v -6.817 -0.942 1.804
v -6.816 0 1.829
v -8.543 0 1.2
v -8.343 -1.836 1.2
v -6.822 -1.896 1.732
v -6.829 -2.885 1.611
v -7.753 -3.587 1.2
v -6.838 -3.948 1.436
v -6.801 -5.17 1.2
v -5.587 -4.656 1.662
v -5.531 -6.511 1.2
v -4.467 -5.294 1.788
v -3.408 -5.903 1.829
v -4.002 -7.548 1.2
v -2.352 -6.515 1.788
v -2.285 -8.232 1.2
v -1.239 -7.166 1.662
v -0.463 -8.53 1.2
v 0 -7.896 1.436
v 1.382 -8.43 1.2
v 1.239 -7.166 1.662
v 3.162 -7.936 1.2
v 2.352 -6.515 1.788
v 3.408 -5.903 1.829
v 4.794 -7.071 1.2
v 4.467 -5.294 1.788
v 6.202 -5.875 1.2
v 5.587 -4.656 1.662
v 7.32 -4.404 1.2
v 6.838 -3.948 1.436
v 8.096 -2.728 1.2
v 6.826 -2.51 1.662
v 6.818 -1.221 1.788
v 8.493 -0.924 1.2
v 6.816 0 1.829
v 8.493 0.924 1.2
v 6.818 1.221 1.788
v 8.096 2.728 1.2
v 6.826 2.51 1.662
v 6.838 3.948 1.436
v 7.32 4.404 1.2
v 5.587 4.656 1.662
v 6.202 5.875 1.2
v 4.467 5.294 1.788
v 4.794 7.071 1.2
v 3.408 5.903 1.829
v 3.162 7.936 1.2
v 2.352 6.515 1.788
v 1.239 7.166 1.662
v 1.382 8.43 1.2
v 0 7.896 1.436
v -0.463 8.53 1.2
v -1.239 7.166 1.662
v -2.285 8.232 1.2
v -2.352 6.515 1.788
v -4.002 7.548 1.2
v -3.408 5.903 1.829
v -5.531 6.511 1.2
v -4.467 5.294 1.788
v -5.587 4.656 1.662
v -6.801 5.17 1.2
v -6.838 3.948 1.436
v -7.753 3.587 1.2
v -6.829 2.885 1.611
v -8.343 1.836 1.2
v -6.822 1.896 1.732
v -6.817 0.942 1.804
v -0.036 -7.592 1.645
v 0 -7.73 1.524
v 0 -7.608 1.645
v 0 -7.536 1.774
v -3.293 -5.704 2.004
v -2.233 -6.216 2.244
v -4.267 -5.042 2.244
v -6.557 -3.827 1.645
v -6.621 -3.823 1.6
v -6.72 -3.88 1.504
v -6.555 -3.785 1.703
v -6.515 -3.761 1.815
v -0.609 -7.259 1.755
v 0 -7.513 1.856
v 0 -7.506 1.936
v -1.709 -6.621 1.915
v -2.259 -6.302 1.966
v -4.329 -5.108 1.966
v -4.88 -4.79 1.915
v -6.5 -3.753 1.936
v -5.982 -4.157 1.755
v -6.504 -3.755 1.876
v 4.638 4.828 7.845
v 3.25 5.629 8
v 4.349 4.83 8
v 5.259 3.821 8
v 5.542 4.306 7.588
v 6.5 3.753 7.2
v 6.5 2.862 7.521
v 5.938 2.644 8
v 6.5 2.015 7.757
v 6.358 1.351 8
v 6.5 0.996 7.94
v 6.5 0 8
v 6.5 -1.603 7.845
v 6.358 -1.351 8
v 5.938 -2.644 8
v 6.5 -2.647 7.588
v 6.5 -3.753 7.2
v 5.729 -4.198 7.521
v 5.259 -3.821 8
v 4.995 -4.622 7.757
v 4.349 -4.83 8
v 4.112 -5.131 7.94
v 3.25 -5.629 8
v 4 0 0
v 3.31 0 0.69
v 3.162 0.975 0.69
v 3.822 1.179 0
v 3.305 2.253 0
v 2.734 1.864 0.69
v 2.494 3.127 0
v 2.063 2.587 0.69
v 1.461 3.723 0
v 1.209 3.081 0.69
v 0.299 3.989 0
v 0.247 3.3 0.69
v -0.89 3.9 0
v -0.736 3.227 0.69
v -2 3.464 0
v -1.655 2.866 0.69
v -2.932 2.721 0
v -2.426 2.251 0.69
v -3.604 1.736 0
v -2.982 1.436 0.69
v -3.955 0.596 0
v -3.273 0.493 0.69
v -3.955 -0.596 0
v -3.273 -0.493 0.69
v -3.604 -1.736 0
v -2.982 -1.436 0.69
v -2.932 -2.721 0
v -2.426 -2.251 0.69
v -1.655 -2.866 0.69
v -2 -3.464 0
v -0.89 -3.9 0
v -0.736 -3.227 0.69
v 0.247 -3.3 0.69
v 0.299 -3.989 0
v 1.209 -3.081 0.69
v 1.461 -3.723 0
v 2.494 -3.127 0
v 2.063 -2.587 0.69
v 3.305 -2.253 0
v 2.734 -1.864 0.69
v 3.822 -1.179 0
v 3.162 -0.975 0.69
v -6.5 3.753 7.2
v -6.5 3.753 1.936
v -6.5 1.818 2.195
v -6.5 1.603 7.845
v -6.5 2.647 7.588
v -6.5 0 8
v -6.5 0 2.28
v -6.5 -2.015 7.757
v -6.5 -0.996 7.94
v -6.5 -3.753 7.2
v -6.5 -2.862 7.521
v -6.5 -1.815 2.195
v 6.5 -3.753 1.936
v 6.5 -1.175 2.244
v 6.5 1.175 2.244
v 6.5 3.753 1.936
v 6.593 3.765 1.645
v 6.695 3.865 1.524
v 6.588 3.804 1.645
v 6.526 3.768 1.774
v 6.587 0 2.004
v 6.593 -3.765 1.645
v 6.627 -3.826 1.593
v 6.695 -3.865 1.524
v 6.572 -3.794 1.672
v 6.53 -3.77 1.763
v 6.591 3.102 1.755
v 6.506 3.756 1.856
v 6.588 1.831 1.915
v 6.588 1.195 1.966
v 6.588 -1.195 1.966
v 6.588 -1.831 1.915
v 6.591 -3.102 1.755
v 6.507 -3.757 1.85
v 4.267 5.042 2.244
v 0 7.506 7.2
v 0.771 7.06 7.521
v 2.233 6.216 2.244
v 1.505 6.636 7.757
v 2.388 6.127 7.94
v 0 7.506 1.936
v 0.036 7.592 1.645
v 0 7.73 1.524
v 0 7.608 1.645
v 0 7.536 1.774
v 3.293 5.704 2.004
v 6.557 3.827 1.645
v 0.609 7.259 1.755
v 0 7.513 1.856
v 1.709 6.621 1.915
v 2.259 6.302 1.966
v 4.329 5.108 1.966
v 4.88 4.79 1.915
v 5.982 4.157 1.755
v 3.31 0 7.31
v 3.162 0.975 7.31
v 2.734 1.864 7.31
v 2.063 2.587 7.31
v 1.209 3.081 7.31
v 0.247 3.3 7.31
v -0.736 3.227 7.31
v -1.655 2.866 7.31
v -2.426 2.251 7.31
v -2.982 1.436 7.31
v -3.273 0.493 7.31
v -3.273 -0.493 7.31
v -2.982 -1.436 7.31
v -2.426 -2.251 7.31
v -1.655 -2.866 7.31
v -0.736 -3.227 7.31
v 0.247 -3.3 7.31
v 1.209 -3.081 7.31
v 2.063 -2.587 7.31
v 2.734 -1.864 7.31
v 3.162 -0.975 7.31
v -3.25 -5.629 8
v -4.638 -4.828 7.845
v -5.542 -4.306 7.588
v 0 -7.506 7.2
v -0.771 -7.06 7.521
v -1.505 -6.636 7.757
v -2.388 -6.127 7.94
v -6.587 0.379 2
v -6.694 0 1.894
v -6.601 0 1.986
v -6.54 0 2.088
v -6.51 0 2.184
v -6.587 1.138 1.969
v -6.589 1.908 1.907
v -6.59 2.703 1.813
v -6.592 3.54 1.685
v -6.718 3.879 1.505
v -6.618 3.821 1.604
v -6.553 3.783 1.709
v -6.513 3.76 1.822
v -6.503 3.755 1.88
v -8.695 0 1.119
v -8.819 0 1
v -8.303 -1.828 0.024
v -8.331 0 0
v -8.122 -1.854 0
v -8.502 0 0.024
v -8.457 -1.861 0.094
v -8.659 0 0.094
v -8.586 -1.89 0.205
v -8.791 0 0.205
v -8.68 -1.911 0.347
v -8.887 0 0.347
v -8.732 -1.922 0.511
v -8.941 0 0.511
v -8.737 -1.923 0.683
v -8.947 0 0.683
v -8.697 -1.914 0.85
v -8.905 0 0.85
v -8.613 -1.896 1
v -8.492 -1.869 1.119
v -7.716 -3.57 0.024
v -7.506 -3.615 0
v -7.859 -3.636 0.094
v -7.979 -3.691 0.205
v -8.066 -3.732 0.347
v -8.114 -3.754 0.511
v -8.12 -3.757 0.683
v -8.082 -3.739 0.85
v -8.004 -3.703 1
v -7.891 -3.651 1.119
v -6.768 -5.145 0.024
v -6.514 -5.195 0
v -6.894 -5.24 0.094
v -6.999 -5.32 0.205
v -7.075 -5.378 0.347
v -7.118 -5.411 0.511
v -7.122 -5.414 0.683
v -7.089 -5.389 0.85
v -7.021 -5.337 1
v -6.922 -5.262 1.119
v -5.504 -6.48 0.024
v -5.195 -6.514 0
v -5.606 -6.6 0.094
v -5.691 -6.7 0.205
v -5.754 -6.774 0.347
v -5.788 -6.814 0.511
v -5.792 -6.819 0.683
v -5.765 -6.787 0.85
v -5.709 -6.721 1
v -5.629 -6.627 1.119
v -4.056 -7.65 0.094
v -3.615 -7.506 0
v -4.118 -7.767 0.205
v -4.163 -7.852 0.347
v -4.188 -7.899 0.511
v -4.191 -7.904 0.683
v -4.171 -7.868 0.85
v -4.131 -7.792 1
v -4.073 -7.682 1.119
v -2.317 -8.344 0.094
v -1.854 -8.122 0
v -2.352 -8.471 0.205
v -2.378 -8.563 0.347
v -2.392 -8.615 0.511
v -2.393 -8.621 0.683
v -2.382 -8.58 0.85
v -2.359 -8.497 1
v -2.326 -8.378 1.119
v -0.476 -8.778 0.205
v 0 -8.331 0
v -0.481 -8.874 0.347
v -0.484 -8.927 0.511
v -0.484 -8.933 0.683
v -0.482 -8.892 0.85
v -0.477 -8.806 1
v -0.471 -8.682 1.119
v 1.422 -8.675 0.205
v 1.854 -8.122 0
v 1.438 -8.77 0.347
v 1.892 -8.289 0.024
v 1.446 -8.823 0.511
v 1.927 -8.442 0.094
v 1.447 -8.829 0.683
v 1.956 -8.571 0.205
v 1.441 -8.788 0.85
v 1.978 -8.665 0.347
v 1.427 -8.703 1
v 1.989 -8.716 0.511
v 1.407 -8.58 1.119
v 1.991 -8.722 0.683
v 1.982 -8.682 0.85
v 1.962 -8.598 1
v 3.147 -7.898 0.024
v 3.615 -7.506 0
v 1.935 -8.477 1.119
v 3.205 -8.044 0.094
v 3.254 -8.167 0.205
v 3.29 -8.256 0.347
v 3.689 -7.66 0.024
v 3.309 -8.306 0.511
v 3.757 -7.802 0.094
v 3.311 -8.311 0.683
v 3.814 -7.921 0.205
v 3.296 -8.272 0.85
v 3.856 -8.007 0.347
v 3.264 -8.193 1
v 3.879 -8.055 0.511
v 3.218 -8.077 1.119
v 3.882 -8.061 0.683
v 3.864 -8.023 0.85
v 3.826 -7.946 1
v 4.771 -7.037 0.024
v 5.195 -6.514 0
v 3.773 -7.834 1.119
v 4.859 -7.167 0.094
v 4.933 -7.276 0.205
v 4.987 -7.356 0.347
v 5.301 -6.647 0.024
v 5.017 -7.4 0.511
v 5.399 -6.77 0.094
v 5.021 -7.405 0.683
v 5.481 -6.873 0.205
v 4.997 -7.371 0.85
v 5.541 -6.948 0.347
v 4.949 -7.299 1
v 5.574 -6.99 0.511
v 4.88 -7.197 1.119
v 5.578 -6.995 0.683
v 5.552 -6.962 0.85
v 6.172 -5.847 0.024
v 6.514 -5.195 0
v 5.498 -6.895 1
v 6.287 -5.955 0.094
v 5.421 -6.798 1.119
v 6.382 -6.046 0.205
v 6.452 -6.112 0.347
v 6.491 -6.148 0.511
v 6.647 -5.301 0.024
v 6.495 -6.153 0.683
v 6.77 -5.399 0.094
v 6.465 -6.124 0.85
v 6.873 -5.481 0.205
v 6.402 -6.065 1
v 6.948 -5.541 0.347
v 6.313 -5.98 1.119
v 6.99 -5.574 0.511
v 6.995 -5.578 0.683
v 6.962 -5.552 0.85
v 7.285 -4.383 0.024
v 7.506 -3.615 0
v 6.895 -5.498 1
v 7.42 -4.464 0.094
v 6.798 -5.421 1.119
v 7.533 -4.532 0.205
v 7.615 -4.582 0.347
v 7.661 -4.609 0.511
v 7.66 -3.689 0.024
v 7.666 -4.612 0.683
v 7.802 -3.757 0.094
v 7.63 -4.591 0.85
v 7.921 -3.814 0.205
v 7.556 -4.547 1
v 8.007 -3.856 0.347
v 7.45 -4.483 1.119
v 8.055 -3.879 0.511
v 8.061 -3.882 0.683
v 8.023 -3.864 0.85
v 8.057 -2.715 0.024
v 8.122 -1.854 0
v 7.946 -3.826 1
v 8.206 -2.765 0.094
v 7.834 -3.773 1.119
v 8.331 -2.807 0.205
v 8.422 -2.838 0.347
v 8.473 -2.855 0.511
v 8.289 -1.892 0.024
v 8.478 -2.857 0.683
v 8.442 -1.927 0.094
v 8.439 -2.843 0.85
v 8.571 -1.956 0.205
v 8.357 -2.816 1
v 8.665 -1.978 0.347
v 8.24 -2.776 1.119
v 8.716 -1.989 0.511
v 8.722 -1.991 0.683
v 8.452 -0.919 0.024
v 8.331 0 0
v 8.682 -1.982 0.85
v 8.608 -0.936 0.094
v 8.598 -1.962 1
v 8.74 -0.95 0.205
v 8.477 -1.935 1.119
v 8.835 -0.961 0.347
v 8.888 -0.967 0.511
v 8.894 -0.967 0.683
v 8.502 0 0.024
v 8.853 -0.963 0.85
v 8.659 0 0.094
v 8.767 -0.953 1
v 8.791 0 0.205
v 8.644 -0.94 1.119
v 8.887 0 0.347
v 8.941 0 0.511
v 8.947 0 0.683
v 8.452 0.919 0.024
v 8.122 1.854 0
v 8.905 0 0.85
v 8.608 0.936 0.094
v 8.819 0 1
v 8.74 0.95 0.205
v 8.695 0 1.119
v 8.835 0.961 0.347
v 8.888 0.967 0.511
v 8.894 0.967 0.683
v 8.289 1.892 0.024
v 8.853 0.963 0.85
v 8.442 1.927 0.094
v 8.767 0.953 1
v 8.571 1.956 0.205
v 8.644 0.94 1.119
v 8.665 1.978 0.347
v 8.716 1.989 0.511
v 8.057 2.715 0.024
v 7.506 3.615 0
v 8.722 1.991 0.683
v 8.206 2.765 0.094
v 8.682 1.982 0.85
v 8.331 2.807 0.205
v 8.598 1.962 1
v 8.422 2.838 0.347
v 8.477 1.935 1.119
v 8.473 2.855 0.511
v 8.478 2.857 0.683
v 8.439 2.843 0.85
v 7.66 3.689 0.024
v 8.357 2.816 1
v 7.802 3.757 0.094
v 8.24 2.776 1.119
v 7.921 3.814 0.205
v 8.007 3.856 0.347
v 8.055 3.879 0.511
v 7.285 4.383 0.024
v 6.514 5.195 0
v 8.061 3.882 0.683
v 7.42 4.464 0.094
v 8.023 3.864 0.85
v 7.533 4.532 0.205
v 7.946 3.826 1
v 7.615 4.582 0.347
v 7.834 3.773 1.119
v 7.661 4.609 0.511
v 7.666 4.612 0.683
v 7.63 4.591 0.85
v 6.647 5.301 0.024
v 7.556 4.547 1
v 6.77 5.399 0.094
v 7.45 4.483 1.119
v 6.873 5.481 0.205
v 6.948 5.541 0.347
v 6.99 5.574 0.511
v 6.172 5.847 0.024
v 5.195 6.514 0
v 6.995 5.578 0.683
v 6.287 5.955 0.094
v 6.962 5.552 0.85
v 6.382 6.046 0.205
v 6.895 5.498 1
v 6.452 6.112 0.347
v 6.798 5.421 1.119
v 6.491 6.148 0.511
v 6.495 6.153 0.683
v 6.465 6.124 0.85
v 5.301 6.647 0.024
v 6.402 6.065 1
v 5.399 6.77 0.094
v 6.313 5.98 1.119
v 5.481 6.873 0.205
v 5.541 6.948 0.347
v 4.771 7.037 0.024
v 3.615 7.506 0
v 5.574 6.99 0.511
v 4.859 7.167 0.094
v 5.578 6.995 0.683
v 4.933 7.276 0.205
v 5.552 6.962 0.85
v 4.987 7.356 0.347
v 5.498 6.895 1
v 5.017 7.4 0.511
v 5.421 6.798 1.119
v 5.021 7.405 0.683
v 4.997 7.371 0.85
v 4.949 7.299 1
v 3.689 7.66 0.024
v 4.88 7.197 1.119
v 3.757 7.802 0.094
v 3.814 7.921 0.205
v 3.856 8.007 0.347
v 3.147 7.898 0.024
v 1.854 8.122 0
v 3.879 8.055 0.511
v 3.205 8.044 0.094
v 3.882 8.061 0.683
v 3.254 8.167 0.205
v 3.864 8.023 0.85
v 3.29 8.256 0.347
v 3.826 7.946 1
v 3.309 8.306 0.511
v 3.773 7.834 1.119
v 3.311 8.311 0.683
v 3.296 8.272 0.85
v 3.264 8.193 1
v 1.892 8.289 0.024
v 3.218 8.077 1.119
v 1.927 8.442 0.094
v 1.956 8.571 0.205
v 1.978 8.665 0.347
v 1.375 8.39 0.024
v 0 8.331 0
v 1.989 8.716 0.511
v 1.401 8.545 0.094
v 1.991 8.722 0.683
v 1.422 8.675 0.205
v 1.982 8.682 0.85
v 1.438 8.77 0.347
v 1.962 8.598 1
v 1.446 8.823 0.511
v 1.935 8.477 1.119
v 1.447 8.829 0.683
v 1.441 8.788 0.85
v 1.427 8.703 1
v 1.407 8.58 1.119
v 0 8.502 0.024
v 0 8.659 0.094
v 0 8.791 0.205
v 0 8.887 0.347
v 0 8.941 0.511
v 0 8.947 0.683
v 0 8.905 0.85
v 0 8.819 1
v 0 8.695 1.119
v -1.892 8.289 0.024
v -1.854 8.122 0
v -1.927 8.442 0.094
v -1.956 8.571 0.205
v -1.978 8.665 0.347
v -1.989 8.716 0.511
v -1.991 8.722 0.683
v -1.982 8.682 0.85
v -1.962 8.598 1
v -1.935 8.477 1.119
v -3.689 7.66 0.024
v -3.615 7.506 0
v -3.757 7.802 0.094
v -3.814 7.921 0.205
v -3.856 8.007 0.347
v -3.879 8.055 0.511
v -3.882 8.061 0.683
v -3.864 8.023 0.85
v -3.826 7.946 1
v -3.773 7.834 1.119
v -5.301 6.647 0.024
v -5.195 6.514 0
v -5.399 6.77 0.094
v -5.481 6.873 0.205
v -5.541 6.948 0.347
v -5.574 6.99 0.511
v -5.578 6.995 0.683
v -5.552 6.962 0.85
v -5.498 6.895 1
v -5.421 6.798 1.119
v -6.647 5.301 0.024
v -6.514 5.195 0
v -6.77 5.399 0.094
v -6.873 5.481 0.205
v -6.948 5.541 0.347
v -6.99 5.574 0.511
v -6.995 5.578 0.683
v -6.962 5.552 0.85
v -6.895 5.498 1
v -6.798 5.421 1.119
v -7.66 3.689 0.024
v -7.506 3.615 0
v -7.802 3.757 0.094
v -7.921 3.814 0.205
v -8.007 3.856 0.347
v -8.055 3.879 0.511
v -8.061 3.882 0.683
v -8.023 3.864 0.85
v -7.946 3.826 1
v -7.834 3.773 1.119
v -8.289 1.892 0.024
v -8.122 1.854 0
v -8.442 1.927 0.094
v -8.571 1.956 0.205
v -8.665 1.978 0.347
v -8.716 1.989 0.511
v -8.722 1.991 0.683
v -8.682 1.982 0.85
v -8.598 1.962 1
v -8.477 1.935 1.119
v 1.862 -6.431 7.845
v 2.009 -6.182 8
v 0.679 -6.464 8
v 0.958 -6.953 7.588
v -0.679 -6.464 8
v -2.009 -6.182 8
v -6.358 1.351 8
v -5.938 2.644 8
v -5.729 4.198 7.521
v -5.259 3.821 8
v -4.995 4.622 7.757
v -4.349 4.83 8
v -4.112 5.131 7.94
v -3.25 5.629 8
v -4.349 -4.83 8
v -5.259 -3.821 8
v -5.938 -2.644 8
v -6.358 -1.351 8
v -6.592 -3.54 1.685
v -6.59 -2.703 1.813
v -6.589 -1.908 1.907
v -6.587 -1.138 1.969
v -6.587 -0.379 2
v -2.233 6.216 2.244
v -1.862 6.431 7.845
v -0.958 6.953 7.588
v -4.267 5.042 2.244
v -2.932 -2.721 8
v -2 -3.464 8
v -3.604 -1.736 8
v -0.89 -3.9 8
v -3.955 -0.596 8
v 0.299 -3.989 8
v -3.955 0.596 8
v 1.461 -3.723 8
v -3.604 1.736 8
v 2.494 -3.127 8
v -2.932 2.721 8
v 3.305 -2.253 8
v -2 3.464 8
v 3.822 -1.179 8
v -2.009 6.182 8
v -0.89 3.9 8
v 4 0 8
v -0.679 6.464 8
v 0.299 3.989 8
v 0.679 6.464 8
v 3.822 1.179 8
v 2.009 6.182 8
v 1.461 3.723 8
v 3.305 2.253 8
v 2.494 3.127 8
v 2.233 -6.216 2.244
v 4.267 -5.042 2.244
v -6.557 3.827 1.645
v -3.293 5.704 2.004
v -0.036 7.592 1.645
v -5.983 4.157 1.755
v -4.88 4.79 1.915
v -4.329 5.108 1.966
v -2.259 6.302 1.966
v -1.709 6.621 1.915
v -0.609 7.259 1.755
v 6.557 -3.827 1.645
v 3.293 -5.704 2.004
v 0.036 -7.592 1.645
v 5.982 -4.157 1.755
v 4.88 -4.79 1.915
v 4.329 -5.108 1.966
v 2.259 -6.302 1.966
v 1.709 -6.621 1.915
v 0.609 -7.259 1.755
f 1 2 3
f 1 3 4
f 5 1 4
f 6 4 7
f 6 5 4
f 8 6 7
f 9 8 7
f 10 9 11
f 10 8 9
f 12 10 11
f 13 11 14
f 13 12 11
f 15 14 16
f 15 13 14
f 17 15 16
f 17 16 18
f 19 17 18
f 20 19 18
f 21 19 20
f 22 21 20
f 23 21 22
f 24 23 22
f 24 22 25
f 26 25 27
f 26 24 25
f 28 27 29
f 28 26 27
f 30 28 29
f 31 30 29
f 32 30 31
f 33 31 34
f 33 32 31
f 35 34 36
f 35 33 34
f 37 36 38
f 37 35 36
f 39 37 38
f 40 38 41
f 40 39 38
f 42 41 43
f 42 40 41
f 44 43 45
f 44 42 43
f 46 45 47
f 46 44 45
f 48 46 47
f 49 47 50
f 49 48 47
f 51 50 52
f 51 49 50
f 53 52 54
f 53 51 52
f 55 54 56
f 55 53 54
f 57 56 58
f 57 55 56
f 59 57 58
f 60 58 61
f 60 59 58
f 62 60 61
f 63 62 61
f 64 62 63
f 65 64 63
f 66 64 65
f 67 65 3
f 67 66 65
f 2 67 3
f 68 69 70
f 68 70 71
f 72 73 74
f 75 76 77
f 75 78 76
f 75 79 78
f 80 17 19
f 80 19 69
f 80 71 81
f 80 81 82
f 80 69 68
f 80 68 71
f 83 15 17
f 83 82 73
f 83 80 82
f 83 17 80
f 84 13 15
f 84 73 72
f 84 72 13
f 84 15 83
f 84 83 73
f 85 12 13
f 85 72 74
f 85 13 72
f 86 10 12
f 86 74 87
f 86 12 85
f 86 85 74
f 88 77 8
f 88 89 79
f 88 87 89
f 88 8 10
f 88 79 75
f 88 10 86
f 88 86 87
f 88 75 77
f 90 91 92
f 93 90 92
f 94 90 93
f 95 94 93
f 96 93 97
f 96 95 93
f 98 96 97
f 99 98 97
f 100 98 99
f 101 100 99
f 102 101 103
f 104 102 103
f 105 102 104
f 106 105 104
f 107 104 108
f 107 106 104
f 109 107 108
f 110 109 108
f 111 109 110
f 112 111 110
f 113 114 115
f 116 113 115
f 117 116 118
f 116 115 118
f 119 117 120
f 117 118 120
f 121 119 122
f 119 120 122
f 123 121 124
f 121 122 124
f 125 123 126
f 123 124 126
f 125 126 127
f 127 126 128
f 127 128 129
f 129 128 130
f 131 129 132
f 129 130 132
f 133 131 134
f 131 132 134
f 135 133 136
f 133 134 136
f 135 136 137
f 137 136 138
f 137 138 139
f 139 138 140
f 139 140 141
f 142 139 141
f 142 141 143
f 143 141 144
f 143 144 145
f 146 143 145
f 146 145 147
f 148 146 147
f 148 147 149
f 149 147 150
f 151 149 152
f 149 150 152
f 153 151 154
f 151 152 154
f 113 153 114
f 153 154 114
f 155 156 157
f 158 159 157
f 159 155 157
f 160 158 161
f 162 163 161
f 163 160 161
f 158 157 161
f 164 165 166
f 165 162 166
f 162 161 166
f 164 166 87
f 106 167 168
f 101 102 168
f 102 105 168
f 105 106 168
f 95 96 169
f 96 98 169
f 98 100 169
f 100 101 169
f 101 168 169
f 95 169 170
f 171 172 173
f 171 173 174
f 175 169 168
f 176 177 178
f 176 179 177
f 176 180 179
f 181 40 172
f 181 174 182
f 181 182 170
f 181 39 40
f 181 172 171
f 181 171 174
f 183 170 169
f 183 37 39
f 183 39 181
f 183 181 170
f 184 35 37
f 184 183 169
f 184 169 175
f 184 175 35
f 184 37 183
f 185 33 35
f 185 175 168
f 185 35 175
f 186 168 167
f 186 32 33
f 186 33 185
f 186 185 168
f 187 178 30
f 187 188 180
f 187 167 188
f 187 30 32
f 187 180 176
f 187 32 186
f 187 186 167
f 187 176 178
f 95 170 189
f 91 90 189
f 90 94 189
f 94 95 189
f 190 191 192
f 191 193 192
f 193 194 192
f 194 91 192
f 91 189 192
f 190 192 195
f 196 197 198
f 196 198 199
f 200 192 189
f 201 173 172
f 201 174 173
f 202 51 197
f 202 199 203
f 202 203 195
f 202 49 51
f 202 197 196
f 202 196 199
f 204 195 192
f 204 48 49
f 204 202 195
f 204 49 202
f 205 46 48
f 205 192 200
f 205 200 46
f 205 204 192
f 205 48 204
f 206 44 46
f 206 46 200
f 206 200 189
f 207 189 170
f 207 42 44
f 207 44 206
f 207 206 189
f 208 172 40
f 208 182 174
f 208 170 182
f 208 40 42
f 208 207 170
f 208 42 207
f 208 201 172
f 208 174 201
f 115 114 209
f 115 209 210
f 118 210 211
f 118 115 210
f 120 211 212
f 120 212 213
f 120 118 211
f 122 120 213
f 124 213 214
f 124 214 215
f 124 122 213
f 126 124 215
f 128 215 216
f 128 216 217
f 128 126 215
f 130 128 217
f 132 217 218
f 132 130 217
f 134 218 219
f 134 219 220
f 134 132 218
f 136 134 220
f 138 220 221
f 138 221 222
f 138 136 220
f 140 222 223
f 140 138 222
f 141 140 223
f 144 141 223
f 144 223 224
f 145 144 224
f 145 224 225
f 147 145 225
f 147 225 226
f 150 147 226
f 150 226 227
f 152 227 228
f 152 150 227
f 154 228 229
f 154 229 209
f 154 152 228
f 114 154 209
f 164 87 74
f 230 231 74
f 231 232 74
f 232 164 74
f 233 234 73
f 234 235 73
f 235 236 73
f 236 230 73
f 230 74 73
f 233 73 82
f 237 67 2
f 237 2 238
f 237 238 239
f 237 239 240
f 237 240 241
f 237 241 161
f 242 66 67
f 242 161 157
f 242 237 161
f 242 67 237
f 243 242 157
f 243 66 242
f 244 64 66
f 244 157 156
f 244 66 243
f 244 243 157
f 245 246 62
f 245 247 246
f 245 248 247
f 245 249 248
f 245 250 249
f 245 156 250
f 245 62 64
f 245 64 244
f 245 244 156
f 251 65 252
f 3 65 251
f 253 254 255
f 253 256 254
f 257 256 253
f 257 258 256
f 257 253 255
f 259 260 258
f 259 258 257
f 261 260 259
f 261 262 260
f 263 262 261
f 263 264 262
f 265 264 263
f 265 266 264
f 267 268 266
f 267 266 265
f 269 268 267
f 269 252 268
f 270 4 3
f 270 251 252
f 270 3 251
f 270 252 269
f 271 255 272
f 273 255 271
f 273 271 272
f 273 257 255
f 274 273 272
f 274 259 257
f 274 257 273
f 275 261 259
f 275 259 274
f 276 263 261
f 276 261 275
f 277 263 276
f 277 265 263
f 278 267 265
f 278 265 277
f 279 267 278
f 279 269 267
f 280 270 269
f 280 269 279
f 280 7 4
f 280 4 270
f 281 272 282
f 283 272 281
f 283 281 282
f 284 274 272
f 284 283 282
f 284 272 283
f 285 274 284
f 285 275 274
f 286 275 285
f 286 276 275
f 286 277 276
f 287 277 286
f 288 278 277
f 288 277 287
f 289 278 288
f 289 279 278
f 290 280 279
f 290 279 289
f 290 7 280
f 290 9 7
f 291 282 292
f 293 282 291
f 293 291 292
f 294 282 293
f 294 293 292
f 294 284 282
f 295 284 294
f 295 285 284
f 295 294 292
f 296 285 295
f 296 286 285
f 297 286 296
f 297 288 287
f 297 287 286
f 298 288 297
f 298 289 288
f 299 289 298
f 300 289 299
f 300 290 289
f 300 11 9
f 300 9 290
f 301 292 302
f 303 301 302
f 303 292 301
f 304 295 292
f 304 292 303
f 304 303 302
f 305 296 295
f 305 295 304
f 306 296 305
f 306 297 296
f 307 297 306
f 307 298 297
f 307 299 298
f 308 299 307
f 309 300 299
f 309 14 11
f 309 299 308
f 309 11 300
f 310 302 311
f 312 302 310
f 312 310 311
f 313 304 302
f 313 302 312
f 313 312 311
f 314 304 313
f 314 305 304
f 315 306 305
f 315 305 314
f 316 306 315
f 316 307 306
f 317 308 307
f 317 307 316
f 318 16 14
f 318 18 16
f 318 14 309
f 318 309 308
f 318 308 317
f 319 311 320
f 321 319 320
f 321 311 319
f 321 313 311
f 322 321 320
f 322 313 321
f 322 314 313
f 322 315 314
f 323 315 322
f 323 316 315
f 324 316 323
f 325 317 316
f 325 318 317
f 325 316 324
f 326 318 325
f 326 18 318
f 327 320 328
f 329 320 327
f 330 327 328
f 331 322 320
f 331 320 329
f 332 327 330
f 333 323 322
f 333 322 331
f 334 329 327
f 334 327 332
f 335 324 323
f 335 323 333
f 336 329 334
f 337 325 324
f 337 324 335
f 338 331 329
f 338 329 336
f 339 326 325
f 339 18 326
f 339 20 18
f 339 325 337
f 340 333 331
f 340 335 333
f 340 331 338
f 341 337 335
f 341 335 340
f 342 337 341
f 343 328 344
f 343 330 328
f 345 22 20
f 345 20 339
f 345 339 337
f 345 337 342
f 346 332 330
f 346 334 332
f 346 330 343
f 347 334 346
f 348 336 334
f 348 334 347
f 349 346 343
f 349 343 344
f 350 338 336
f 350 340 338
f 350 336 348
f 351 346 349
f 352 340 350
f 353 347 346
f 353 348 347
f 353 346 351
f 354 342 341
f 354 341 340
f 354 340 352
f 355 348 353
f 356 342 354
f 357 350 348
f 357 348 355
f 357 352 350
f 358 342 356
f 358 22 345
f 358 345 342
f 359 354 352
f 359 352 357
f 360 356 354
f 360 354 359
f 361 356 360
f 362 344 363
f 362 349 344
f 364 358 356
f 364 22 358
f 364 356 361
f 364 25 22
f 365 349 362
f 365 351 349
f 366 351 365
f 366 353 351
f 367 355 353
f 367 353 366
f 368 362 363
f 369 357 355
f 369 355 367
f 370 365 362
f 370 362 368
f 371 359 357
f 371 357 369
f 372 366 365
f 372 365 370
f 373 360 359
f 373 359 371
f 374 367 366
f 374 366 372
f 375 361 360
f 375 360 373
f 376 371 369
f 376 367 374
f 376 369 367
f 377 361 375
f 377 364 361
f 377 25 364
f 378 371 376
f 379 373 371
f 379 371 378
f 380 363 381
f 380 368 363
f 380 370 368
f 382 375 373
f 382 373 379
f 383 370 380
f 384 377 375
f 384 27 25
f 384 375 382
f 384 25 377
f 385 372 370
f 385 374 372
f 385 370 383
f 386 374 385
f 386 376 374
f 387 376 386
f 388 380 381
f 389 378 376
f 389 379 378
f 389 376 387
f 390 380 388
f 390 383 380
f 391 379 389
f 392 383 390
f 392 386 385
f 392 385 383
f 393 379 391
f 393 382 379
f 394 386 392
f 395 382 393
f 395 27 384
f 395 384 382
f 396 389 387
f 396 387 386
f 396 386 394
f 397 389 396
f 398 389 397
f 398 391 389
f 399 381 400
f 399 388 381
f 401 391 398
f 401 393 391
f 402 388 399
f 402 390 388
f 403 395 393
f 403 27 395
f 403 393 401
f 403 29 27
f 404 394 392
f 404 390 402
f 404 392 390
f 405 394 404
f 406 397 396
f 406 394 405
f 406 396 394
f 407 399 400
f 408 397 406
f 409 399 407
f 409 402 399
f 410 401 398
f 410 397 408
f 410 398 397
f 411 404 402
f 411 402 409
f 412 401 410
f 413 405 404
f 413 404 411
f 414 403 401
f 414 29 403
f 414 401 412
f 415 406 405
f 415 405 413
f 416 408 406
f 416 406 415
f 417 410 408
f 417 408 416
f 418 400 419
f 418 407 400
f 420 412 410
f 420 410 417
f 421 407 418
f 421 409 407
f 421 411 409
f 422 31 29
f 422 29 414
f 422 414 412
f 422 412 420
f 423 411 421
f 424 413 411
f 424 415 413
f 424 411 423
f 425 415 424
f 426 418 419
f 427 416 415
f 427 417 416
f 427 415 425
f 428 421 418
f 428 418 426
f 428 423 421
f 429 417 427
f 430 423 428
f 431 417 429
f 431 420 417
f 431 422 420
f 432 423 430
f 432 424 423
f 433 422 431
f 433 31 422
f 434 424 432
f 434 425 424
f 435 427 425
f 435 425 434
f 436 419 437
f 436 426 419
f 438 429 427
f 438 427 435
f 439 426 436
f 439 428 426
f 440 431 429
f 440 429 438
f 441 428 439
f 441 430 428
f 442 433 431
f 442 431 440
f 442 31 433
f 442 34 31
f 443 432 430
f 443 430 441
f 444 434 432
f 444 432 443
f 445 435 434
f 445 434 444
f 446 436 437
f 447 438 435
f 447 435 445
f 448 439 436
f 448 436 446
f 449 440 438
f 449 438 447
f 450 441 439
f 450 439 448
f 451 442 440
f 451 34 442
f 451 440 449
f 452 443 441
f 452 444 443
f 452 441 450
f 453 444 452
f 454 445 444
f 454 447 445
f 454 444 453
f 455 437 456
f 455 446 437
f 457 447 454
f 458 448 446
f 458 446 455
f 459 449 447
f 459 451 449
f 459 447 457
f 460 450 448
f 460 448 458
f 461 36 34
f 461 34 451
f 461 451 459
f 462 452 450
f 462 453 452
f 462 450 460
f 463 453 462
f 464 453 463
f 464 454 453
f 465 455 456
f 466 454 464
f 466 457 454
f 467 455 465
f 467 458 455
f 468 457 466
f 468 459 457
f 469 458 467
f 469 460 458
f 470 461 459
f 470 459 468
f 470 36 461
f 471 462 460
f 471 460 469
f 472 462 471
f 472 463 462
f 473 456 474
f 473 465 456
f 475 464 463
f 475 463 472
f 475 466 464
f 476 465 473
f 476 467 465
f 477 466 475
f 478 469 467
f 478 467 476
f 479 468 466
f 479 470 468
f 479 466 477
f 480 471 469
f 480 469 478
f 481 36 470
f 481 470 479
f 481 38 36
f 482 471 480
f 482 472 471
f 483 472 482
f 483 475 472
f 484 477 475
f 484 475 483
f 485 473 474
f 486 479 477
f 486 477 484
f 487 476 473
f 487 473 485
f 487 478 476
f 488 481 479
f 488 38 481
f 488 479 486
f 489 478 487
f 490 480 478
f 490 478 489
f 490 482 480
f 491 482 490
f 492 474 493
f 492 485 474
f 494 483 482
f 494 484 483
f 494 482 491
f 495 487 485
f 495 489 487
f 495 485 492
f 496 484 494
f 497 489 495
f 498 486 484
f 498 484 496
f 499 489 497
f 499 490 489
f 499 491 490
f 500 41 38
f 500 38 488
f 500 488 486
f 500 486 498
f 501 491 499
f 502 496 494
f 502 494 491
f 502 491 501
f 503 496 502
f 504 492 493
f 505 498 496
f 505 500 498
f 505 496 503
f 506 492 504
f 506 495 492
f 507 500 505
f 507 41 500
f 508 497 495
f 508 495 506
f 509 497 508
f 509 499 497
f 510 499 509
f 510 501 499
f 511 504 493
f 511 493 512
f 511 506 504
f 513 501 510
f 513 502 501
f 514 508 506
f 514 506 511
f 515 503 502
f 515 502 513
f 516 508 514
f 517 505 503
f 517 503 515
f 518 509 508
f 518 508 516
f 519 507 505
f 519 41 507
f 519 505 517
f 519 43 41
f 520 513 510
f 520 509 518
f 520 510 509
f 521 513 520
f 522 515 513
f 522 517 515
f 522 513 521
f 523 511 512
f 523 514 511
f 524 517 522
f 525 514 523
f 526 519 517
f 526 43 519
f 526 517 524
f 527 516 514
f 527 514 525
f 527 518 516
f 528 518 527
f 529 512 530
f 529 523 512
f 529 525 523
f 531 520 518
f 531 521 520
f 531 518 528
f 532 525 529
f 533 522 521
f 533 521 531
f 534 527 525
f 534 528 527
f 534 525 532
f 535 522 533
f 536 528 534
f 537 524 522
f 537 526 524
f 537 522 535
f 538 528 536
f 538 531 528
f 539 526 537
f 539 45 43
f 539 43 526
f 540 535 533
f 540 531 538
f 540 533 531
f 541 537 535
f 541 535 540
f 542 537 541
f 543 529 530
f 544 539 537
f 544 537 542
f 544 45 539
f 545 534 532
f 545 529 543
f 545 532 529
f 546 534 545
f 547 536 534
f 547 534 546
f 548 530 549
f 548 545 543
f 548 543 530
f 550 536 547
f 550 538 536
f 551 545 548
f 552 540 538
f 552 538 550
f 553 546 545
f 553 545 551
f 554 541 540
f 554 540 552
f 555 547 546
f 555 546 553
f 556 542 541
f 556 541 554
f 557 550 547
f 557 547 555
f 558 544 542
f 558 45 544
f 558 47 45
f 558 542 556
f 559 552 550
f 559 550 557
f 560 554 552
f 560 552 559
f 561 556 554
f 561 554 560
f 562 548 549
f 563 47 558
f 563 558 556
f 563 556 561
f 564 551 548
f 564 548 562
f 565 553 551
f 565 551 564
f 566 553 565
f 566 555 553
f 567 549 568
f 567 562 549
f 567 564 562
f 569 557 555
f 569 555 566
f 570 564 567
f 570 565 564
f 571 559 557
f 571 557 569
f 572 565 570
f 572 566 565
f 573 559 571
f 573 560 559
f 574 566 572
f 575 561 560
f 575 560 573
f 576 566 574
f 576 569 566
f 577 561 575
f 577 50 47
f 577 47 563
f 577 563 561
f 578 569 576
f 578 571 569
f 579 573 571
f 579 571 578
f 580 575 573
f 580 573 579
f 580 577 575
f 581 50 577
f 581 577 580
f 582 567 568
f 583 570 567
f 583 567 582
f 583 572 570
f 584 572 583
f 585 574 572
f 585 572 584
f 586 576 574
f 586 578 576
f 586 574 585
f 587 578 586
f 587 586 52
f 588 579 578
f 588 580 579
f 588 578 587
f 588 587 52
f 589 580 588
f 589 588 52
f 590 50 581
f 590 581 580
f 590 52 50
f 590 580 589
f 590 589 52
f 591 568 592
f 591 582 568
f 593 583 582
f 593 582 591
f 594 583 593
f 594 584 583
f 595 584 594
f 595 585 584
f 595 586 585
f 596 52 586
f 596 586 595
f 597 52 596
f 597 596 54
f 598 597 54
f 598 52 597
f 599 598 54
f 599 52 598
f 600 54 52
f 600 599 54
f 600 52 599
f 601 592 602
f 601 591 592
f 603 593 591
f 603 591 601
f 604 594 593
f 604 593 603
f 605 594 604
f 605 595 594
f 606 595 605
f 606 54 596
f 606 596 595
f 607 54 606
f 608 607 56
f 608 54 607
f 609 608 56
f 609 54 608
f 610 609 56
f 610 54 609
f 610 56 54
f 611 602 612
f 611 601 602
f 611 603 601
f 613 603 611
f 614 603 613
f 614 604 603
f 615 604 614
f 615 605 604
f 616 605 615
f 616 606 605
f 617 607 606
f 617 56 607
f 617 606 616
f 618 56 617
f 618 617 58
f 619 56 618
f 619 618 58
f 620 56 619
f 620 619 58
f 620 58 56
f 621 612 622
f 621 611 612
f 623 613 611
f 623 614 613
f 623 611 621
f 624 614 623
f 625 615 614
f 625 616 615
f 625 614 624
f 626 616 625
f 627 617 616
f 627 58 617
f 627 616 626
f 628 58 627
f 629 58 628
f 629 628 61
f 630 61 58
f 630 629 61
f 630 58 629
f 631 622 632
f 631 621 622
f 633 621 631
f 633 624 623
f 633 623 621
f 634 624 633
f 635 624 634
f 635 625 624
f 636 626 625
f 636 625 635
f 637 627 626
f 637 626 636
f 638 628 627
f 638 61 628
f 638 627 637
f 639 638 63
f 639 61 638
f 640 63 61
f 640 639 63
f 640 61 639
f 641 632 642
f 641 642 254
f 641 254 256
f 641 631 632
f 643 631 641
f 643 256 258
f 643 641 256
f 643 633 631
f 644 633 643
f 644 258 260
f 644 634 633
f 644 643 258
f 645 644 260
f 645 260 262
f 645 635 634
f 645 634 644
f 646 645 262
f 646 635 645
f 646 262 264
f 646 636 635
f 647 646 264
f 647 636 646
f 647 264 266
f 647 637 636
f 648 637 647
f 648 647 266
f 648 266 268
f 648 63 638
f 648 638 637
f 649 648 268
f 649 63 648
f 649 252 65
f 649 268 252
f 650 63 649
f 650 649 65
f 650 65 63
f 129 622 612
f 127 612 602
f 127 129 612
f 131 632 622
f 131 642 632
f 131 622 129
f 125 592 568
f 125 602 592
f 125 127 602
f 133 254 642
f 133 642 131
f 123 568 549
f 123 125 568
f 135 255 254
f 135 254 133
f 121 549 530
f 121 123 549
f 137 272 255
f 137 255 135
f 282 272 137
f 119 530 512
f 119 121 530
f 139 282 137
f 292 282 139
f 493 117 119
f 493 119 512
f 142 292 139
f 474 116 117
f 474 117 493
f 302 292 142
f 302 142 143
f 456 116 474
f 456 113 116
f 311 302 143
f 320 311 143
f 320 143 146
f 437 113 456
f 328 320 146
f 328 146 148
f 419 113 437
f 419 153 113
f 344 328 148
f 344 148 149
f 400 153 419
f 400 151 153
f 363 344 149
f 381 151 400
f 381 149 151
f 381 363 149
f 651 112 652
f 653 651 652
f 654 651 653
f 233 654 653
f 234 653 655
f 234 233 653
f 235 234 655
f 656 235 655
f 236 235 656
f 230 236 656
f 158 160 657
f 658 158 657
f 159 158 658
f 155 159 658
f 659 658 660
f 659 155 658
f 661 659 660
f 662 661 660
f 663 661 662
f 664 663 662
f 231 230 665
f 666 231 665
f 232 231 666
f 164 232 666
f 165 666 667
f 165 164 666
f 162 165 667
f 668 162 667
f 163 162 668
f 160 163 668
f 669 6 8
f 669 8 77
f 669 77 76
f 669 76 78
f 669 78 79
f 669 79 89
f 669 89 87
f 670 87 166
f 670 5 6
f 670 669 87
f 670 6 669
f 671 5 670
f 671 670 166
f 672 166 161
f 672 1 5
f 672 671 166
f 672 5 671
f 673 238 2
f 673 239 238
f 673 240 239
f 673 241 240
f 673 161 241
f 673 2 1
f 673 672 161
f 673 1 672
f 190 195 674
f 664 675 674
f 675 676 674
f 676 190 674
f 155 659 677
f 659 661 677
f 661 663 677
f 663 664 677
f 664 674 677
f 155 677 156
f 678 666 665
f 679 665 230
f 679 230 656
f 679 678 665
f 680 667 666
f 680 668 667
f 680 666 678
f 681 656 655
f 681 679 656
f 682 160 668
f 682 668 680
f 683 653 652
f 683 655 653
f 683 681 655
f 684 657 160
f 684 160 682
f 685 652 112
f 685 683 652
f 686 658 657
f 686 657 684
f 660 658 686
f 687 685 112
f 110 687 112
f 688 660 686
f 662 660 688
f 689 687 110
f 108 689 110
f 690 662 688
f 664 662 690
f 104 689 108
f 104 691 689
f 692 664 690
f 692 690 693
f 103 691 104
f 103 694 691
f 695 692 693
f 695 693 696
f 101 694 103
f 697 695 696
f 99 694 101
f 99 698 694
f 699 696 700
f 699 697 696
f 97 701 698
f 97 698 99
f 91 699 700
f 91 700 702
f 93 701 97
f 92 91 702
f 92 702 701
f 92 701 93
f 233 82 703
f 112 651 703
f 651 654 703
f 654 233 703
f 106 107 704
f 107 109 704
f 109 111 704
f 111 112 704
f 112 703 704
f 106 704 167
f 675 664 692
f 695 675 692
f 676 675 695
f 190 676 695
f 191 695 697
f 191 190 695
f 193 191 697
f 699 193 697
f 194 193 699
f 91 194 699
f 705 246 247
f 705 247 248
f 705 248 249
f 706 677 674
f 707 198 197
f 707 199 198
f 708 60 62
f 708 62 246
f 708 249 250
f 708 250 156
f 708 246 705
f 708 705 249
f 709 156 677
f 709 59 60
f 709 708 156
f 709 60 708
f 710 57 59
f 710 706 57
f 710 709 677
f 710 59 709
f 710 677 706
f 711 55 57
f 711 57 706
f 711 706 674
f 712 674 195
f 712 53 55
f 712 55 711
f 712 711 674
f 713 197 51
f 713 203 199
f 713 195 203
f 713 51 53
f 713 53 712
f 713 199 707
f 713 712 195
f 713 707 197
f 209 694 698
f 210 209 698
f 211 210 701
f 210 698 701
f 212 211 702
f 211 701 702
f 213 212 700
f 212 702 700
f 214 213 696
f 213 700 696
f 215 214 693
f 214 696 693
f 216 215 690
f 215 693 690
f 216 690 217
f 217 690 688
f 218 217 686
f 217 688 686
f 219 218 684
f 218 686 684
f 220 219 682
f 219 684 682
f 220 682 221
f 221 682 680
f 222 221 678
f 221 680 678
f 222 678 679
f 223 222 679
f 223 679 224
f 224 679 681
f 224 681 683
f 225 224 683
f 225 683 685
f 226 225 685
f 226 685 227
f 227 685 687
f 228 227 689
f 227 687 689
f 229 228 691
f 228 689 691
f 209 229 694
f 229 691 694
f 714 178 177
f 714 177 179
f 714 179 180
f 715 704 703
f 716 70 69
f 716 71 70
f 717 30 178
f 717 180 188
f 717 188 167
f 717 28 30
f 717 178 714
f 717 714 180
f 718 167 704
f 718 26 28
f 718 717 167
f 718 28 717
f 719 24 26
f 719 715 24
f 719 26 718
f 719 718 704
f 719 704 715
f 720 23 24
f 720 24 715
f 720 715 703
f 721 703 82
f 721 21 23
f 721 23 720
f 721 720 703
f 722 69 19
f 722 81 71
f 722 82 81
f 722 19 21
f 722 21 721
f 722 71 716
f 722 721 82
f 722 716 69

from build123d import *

# Parameters (mm, degrees)
SCHIZZO1_R                   = 3.3095
ESTRUSIONE_ESTRUSIONE1_DEPTH = 8
RACCORDO1_R                  = 0.48
SMUSSO1_SIZE                 = 0.6905


with BuildPart() as part:
    # Schizzo1 → Estrusione-Estrusione1 (new body)
    with BuildSketch(Plane.XY):
        Polygon((0, 7.505553499), (-6.5, 3.75277675), (-6.5, -3.75277675), (0, -7.505553499), (6.5, -3.75277675), (6.5, 3.75277675), align=None)
        Circle(SCHIZZO1_R, mode=Mode.SUBTRACT)
    extrude(amount=ESTRUSIONE_ESTRUSIONE1_DEPTH)

    # Schizzo2 → Rivoluzione1 (revolve)
    with BuildSketch(Plane(origin=(0, 0, 0), x_dir=(0, 0, -1), z_dir=(1, 0, 0)), mode=Mode.PRIVATE) as rivoluzione1_sk:
        with BuildLine():
            Line((0, 3.3095), (0, 8.331345278))
            ThreePointArc((0, 8.331345278), (-0.511226457, 8.940601245), (-1.2, 8.542937654))
            Line((-1.2, 8.542937654), (-3.104815529, 3.3095))
            Line((-3.104815529, 3.3095), (0, 3.3095))
        make_face()
    revolve(rivoluzione1_sk.sketch.rotate(Axis((0, 0, 0), (0, 0, 1)), 90), axis=Axis((0, 0, 0), (0, 0, 1)))

    # Schizzo3 → Taglia-Rivoluzione1 (revolve, cut)
    with BuildSketch(Plane(origin=(0, 0, 0), x_dir=(0, 0, -1), z_dir=(1, 0, 0)), mode=Mode.PRIVATE) as taglia_rivoluzione1_sk:
        Polygon((-8, 6.5), (-7.2, 7.505553499), (-7.2, 20.205553499), (-20.7, 20.205553499), (-20.7, 6.5), align=None)
    revolve(taglia_rivoluzione1_sk.sketch.rotate(Axis((0, 0, 8), (0, 0, -1)), 270), axis=Axis((0, 0, 8), (0, 0, -1)), mode=Mode.SUBTRACT)

    # Raccordo1
    raccordo1_edges = [part.edges().sort_by_distance(p)[0] for p in [
        (-6.5, -1.884573791, 1.846137562),
        (-3.25, -5.629165125, 1.943568497),
        (3.25, -5.629165125, 1.943568497),
        (6.5, 0, 1.943568497),
        (3.25, 5.629165125, 1.943568497),
        (-3.25, 5.629165125, 1.943568497),
        (-6.5, 1.884573791, 1.846137562),
    ]]
    fillet(raccordo1_edges, radius=RACCORDO1_R)

    # Smusso1
    smusso1_edges = [part.edges().sort_by_distance(p)[0] for p in [
        (-3.3095, 0, 0),
        (-3.3095, 0, 8),
    ]]
    chamfer(smusso1_edges, length=SMUSSO1_SIZE)


solid = part.part
